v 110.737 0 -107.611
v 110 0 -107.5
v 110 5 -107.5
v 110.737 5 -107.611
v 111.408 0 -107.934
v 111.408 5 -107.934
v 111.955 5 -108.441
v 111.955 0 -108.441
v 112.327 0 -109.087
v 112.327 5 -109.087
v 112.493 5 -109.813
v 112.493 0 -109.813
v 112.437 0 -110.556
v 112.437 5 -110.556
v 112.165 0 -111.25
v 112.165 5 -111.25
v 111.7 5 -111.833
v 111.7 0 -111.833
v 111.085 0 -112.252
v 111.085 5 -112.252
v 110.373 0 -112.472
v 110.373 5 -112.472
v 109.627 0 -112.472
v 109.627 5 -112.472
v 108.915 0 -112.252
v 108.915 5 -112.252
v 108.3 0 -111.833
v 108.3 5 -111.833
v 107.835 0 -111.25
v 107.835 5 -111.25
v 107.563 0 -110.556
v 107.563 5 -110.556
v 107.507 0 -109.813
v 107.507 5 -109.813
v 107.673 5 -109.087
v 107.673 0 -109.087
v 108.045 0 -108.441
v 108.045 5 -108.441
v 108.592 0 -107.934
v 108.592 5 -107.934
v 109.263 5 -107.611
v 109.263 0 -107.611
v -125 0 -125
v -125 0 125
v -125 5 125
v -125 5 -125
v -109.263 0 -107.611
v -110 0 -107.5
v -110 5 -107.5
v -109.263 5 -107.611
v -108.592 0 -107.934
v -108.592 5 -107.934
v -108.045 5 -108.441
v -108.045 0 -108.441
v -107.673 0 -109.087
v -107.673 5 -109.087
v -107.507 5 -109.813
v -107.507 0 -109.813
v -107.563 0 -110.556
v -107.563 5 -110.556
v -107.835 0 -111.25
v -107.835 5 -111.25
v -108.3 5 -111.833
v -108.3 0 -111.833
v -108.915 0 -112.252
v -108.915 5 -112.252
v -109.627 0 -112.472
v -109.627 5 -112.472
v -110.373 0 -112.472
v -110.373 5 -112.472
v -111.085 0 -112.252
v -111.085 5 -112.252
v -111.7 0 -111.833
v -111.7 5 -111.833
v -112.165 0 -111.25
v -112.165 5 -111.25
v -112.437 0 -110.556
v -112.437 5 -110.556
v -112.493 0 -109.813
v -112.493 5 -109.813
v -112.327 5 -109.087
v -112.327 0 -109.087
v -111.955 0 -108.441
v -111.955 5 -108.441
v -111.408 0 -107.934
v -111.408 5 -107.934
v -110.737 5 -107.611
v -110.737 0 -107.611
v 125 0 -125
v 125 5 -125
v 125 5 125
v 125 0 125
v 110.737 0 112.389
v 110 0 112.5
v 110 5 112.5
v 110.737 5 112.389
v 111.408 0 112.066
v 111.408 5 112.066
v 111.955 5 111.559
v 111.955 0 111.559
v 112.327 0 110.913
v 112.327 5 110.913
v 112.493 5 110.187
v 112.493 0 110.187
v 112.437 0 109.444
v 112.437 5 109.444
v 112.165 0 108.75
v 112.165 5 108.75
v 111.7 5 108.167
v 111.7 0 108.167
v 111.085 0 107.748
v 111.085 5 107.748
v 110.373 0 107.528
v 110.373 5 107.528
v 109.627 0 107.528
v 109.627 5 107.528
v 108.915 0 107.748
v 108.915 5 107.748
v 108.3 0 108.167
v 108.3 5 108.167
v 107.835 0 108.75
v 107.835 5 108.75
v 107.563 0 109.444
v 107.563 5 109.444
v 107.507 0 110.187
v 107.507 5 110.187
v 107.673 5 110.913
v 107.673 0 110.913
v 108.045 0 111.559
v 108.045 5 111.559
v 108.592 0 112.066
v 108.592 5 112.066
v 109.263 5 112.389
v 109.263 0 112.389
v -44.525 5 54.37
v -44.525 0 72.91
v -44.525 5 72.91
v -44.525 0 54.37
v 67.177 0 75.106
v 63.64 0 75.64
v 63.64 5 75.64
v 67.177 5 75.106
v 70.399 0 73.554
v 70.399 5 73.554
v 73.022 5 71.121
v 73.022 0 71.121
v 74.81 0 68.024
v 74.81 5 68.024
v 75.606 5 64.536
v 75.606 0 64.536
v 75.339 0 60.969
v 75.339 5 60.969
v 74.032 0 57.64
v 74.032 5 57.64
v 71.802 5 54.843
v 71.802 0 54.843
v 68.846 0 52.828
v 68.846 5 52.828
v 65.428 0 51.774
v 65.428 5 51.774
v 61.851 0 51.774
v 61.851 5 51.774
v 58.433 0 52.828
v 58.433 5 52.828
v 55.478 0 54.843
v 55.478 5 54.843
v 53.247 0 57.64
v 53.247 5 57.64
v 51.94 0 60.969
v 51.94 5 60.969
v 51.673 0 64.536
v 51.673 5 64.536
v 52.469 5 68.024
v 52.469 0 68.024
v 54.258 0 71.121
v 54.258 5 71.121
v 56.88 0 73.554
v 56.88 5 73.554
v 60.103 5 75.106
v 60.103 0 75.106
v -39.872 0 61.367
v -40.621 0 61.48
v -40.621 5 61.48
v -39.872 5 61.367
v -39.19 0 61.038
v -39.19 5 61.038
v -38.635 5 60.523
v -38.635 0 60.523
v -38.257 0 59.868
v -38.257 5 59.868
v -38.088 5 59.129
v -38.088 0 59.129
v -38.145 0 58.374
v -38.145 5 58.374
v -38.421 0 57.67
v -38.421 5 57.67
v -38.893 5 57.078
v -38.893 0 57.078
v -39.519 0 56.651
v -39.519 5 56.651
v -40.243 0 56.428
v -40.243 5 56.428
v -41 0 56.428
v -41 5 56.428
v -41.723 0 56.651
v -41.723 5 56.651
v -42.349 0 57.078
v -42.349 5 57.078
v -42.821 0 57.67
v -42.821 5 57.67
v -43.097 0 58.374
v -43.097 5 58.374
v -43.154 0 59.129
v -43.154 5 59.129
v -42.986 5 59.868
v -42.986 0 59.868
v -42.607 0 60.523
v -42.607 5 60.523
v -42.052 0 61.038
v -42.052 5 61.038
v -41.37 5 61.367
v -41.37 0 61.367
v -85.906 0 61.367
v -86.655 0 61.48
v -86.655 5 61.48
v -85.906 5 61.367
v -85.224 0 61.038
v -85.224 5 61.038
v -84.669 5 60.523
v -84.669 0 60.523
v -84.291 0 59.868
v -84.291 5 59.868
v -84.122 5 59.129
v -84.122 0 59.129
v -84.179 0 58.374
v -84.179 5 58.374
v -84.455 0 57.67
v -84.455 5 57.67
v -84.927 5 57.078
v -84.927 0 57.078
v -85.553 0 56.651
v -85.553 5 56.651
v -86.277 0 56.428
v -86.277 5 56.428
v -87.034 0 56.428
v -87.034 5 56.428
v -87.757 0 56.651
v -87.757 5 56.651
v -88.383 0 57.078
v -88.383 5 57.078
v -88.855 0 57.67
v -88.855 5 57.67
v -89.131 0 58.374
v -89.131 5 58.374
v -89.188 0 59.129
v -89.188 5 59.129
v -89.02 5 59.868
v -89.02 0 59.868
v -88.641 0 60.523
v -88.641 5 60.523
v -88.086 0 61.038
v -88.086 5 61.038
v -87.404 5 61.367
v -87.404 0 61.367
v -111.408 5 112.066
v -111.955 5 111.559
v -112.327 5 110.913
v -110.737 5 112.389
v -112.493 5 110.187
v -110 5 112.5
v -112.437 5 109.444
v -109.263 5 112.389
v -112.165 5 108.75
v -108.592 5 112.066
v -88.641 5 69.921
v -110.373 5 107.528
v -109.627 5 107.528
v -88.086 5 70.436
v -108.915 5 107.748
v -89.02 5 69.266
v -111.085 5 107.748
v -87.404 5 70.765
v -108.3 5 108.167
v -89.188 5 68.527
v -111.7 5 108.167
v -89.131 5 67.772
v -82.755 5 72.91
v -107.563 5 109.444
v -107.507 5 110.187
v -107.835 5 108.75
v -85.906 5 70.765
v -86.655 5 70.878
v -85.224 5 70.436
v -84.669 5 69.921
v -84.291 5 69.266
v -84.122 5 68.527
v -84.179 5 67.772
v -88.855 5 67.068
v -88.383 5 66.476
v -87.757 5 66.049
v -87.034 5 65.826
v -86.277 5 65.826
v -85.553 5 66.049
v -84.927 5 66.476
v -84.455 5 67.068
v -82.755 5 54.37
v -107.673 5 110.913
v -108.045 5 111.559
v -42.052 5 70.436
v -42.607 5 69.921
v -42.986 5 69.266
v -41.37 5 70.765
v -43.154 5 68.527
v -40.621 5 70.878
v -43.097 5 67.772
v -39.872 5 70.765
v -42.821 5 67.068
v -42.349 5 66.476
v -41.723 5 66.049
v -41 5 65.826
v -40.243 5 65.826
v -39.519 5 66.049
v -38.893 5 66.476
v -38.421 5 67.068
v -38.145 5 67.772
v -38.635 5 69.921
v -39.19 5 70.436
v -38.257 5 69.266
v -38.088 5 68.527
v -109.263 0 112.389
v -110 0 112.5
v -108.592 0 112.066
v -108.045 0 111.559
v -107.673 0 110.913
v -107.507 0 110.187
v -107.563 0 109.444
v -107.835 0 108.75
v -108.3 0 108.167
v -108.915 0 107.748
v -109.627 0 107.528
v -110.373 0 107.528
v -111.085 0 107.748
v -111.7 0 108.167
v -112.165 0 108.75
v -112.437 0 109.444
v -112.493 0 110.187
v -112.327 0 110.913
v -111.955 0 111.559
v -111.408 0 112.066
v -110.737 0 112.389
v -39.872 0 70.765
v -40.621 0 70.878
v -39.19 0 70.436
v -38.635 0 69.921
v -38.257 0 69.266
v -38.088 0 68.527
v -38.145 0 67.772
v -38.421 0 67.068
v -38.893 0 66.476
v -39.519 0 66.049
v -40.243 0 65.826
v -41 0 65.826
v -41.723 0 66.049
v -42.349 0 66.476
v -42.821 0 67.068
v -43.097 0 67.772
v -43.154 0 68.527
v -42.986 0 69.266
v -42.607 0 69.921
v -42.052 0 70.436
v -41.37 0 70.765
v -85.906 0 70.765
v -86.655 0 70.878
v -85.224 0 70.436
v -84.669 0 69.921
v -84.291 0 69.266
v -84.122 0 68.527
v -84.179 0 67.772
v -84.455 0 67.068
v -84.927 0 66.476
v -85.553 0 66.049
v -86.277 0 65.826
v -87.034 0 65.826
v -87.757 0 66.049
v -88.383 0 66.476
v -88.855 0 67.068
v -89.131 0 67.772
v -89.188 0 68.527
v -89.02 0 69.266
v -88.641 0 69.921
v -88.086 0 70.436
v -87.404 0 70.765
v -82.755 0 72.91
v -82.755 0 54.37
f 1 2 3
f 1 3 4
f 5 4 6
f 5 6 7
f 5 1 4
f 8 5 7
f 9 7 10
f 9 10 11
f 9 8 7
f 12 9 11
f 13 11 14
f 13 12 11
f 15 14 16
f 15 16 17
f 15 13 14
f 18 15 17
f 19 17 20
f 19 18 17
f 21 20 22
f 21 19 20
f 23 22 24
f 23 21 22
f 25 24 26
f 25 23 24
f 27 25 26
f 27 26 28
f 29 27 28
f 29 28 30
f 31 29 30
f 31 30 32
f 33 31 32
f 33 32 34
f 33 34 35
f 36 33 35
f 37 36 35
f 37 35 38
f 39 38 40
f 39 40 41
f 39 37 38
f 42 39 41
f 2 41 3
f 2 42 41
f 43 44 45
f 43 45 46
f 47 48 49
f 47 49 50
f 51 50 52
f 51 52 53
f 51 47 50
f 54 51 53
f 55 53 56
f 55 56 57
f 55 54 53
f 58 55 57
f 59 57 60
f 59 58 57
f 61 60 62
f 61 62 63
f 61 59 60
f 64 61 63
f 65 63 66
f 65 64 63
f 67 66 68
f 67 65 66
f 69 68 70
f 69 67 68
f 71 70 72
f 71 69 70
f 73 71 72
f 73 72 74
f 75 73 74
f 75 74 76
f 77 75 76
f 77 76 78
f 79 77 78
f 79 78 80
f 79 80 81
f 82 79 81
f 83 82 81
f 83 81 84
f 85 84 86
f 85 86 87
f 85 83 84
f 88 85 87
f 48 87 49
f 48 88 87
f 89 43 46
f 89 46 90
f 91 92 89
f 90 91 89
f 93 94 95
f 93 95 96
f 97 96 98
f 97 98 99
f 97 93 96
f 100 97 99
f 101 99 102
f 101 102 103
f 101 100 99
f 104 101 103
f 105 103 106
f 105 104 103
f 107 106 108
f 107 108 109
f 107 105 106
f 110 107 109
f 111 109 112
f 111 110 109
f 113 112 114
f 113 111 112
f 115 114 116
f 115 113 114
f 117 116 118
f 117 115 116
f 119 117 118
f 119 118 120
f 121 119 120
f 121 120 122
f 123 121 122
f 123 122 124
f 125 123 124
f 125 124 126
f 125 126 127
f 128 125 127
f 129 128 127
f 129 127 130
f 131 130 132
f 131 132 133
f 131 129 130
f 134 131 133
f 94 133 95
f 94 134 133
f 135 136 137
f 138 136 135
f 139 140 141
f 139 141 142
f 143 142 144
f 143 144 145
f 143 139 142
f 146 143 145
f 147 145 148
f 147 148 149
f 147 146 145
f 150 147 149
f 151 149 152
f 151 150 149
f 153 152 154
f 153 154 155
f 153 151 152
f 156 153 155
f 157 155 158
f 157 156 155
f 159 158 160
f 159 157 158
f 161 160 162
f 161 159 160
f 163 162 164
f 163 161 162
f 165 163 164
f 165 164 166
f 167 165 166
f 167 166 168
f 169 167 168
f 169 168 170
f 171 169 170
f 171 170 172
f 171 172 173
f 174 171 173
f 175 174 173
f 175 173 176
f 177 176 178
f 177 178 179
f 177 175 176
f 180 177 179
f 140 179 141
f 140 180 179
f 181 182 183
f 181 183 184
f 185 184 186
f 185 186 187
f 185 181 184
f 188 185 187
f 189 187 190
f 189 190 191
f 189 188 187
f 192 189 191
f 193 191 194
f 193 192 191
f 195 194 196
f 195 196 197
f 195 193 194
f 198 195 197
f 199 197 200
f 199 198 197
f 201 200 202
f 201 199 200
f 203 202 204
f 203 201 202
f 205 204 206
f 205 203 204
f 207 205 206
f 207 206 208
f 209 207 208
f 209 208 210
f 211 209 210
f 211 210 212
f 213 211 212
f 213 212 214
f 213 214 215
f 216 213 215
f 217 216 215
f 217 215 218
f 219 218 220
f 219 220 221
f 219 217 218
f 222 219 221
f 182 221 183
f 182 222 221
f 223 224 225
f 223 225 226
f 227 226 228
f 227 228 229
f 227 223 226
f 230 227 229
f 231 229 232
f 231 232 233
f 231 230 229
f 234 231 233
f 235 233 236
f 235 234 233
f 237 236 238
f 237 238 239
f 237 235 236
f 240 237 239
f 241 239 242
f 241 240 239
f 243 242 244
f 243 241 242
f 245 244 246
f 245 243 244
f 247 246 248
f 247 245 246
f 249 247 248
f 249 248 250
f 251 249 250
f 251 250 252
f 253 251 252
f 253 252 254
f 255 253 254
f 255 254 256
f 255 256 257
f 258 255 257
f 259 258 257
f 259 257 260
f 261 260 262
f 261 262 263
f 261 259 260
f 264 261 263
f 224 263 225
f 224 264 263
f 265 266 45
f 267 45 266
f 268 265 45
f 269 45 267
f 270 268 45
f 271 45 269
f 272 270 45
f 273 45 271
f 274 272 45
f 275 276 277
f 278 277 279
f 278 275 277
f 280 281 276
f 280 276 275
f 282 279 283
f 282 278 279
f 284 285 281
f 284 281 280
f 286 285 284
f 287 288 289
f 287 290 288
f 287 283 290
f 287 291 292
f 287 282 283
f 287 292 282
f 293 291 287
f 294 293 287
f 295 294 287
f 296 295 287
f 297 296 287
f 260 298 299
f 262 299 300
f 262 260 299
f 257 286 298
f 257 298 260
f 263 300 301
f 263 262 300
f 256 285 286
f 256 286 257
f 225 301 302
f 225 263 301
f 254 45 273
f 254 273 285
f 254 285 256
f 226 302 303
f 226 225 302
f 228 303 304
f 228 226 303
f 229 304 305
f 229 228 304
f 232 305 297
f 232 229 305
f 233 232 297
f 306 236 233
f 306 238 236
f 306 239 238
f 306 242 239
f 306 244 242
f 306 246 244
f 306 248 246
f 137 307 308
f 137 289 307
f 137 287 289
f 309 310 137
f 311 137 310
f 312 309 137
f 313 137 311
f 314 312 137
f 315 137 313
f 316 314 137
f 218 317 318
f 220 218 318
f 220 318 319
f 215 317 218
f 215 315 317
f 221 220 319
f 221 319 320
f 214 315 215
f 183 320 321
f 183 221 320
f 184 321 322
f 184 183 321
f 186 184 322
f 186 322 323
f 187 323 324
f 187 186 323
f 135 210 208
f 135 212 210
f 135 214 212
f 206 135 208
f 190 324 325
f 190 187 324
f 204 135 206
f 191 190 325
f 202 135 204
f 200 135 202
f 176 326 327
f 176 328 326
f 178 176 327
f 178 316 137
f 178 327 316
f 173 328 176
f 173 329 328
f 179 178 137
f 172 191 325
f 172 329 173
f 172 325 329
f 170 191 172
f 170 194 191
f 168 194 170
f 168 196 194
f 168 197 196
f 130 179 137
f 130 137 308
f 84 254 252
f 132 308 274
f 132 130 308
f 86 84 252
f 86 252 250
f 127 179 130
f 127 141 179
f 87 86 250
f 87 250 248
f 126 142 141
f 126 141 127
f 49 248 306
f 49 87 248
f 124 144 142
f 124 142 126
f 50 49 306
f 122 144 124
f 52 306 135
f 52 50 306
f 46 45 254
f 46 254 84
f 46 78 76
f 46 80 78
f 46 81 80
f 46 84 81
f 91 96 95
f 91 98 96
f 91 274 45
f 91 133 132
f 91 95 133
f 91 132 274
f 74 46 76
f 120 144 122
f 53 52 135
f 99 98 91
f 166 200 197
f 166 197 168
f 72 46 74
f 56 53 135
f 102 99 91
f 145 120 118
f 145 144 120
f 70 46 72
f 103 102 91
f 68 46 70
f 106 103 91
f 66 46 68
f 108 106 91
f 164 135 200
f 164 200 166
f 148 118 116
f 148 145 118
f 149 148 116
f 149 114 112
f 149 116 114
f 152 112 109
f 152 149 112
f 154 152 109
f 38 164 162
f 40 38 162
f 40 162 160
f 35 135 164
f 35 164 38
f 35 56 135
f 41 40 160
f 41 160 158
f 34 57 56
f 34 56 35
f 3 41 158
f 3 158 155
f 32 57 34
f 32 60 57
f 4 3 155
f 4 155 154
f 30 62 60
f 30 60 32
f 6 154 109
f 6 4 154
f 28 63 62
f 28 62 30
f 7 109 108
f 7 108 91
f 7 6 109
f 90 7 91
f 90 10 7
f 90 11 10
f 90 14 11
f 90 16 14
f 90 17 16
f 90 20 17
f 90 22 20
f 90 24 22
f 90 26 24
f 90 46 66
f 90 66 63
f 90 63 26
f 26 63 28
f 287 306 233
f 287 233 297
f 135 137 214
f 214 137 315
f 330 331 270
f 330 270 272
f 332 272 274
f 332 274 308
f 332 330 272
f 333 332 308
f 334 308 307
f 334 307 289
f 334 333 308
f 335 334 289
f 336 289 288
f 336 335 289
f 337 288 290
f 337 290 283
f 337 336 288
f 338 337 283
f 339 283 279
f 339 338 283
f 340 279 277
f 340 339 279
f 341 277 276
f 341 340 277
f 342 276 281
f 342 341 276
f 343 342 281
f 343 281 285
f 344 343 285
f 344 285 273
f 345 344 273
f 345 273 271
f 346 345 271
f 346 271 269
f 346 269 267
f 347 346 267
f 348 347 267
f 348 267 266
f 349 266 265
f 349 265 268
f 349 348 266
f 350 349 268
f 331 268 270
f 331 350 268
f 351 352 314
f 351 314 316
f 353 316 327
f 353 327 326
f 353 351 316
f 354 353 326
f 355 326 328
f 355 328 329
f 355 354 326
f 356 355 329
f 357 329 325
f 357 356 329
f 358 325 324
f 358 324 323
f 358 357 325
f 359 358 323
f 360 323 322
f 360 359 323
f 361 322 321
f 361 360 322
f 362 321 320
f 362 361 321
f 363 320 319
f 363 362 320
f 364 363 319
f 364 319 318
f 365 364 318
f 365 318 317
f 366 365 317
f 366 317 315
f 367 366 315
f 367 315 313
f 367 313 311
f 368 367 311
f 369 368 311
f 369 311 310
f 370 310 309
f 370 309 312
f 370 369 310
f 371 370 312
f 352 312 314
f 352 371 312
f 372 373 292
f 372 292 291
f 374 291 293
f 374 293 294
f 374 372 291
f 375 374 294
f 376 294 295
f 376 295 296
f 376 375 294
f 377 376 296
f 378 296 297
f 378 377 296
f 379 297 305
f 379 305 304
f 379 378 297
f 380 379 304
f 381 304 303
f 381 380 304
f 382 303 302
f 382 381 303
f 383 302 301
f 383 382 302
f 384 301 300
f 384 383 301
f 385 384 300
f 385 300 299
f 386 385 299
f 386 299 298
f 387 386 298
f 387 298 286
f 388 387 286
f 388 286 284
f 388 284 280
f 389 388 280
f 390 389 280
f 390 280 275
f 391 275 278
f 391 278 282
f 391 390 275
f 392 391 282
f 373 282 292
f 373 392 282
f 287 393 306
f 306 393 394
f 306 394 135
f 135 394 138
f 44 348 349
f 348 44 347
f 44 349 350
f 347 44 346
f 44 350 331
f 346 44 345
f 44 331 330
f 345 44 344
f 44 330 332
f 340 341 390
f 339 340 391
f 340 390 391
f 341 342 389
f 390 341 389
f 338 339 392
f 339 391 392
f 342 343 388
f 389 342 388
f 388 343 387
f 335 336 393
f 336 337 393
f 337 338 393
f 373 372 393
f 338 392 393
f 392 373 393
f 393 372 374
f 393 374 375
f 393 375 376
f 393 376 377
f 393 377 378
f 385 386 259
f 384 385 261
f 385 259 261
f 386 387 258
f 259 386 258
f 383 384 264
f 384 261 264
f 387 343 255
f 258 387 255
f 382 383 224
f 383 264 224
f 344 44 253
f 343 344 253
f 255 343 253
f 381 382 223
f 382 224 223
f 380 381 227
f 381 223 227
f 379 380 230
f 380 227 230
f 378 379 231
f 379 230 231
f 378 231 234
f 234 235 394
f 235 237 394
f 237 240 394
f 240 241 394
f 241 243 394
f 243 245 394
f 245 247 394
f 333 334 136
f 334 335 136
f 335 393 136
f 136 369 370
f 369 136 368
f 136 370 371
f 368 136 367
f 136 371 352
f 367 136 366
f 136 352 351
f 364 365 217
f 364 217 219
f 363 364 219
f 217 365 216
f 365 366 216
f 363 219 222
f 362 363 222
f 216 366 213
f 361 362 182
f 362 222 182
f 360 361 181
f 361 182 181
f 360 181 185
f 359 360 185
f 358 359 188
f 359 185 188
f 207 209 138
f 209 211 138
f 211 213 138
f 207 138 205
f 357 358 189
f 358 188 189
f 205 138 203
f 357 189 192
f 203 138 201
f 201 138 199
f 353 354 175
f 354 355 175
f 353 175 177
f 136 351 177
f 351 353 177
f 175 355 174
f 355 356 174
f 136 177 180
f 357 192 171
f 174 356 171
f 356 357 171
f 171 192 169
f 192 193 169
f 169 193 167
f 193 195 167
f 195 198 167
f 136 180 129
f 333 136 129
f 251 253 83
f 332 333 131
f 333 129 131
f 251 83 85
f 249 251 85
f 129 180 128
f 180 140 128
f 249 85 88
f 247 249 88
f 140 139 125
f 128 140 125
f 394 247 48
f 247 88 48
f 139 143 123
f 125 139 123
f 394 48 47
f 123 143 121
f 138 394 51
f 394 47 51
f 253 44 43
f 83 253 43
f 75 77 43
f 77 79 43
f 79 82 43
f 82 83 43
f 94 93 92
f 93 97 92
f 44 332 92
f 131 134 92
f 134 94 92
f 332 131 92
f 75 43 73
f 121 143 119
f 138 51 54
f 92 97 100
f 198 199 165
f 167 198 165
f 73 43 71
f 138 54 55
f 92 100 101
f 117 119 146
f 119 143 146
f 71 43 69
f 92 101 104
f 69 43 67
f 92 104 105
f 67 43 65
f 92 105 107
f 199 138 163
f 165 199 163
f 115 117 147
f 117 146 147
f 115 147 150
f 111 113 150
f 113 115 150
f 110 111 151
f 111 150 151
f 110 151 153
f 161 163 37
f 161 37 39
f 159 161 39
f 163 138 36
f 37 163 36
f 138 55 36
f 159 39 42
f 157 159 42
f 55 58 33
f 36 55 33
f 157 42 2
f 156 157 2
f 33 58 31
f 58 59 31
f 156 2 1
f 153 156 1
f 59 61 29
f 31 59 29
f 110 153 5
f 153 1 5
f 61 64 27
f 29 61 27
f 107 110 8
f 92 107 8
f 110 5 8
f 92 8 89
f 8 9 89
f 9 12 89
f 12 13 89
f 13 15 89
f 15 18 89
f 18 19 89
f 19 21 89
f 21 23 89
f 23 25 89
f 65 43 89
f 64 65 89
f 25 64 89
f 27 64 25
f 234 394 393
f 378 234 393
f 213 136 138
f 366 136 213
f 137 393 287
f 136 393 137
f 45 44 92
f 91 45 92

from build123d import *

# Parameters (mm, degrees)
SCHIZZO1_W                   = 250
SCHIZZO1_H                   = 250
SCHIZZO1_R                   = 2.5
SCHIZZO1_R_2                 = 12
SCHIZZO1_R_3                 = 2.54
SCHIZZO1_W_2                 = 38.23
SCHIZZO1_H_2                 = 18.54
ESTRUSIONE_ESTRUSIONE1_DEPTH = 5


with BuildPart() as part:
    # Schizzo1 → Estrusione-Estrusione1 (new body)
    with BuildSketch(Plane(origin=(0, 0, 0), x_dir=(1, 0, 0), z_dir=(0, 1, 0))):
        Rectangle(SCHIZZO1_W, SCHIZZO1_H)
        with Locations(Location((-110, 110, 0), (0, 0, 270))):
            Circle(SCHIZZO1_R, mode=Mode.SUBTRACT)
        with Locations(Location((110, 110, 0), (0, 0, 270))):
            Circle(SCHIZZO1_R, mode=Mode.SUBTRACT)
        with Locations(Location((-110, -110, 0), (0, 0, 270))):
            Circle(SCHIZZO1_R, mode=Mode.SUBTRACT)
        with Locations(Location((110, -110, 0), (0, 0, 270))):
            Circle(SCHIZZO1_R, mode=Mode.SUBTRACT)
        with Locations(Location((63.639610307, -63.639610307, 0), (0, 0, 270))):
            Circle(SCHIZZO1_R_2, mode=Mode.SUBTRACT)
        with Locations(Location((-86.655104778, -58.939610307, 0), (0, 0, 270))):
            Circle(SCHIZZO1_R_3, mode=Mode.SUBTRACT)
        with Locations(Location((-86.655104778, -68.337610307, 0), (0, 0, 270))):
            Circle(SCHIZZO1_R_3, mode=Mode.SUBTRACT)
        with Locations(Location((-40.621115836, -68.337610307, 0), (0, 0, 270))):
            Circle(SCHIZZO1_R_3, mode=Mode.SUBTRACT)
        with Locations(Location((-40.621115836, -58.939610307, 0), (0, 0, 270))):
            Circle(SCHIZZO1_R_3, mode=Mode.SUBTRACT)
        with Locations((-63.639610307, -63.639610307)):
            Rectangle(SCHIZZO1_W_2, SCHIZZO1_H_2, mode=Mode.SUBTRACT)
    extrude(amount=ESTRUSIONE_ESTRUSIONE1_DEPTH)


solid = part.part
